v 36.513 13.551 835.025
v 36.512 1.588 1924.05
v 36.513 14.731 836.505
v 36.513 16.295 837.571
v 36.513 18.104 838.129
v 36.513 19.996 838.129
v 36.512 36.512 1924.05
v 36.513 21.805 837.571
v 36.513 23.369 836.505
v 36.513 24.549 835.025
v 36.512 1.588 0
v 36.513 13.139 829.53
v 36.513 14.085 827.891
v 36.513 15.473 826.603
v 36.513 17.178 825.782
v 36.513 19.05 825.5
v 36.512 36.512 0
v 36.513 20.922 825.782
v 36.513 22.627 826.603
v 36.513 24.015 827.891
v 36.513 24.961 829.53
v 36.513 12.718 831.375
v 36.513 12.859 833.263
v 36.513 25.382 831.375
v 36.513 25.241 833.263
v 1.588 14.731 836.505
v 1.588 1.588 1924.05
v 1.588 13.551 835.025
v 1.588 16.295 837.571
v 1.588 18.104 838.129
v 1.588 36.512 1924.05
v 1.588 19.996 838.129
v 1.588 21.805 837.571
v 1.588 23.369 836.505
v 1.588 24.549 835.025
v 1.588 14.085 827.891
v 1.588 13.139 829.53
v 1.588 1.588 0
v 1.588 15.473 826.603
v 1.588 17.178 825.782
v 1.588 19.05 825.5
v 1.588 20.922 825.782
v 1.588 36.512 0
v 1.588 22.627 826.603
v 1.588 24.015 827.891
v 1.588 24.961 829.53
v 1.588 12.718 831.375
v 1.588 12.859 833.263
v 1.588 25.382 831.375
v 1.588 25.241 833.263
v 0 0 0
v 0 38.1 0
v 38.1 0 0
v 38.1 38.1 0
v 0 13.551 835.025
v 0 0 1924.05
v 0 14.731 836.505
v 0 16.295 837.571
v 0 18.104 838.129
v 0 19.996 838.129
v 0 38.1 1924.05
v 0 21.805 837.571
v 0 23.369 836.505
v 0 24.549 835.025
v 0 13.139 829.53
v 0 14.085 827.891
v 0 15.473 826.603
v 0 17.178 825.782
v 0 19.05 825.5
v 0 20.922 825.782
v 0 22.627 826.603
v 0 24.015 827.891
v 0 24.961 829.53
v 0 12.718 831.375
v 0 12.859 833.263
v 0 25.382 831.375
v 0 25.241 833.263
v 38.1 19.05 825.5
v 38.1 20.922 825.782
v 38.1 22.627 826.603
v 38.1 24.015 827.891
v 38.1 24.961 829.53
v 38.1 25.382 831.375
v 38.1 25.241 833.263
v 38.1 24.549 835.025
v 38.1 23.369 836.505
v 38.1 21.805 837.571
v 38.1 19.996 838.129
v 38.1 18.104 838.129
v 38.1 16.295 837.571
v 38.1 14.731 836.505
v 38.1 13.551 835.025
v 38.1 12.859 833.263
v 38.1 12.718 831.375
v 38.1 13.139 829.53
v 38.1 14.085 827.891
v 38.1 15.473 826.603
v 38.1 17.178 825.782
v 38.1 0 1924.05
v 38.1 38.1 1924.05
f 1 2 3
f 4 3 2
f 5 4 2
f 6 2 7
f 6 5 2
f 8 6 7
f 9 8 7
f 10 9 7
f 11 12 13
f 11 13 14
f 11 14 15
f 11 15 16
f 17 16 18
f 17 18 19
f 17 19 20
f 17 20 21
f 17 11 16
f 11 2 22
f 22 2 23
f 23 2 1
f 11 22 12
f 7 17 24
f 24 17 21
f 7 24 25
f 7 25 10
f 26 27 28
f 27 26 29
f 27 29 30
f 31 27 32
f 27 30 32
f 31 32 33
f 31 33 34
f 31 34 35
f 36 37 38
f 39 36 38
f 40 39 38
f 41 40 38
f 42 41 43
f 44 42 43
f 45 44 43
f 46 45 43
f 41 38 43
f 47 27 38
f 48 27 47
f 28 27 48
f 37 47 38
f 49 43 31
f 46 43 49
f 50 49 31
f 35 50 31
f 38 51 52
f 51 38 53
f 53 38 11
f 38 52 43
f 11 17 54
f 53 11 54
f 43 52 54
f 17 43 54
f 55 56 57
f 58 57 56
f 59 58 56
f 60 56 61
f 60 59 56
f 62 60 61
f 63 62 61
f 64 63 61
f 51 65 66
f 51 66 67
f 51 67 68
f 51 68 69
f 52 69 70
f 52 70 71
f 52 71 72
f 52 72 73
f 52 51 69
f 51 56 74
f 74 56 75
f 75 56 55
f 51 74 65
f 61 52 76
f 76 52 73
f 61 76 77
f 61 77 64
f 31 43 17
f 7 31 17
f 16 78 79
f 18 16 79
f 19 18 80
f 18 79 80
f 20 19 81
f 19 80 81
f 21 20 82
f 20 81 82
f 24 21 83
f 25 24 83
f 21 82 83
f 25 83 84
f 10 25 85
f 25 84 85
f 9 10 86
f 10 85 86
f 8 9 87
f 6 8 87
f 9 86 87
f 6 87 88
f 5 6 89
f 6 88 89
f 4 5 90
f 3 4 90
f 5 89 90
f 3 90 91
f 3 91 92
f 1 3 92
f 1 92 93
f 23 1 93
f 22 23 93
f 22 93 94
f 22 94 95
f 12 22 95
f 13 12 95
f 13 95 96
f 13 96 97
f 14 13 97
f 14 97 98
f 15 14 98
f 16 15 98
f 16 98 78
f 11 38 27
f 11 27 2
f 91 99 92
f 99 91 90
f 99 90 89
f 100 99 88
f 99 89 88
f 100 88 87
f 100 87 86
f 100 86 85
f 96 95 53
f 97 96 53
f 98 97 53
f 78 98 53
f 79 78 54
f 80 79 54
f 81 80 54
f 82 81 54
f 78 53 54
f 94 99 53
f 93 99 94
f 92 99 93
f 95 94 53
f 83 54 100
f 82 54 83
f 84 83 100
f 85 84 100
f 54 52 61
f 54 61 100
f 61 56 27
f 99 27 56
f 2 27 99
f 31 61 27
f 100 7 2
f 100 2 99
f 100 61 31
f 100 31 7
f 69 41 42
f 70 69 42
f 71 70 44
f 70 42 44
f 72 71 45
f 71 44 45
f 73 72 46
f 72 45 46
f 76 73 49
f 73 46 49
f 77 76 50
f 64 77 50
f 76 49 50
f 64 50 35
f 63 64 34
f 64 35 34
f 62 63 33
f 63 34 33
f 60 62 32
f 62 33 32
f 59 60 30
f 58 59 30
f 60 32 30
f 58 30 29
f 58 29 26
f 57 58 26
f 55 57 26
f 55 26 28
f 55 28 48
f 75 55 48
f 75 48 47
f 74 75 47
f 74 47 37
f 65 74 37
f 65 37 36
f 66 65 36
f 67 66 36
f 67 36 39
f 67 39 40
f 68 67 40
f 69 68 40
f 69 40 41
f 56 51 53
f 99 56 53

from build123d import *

# Parameters (mm, degrees)
SKETCH2_W                  = 38.1
SKETCH2_H                  = 38.1
SKETCH2_W_2                = 34.925
SKETCH2_H_2                = 34.925
BOSS_EXTRUDE1_DEPTH        = 1924.05
F_1_2_0_5_DIAMETER_HOLE1_D = 12.7


with BuildPart() as part:
    # Sketch2 → Boss-Extrude1 (new body)
    with BuildSketch(Plane.XY):
        with Locations((19.05, 19.05)):
            Rectangle(SKETCH2_W, SKETCH2_H)
        with Locations((19.05, 19.05)):
            Rectangle(SKETCH2_W_2, SKETCH2_H_2, mode=Mode.SUBTRACT)
    extrude(amount=BOSS_EXTRUDE1_DEPTH)

    # 1/2 (0.5) Diameter Hole1 (through all)
    with Locations(Plane.ZY):
        with Locations((831.85, 19.05)):
            Hole(F_1_2_0_5_DIAMETER_HOLE1_D / 2)


solid = part.part
